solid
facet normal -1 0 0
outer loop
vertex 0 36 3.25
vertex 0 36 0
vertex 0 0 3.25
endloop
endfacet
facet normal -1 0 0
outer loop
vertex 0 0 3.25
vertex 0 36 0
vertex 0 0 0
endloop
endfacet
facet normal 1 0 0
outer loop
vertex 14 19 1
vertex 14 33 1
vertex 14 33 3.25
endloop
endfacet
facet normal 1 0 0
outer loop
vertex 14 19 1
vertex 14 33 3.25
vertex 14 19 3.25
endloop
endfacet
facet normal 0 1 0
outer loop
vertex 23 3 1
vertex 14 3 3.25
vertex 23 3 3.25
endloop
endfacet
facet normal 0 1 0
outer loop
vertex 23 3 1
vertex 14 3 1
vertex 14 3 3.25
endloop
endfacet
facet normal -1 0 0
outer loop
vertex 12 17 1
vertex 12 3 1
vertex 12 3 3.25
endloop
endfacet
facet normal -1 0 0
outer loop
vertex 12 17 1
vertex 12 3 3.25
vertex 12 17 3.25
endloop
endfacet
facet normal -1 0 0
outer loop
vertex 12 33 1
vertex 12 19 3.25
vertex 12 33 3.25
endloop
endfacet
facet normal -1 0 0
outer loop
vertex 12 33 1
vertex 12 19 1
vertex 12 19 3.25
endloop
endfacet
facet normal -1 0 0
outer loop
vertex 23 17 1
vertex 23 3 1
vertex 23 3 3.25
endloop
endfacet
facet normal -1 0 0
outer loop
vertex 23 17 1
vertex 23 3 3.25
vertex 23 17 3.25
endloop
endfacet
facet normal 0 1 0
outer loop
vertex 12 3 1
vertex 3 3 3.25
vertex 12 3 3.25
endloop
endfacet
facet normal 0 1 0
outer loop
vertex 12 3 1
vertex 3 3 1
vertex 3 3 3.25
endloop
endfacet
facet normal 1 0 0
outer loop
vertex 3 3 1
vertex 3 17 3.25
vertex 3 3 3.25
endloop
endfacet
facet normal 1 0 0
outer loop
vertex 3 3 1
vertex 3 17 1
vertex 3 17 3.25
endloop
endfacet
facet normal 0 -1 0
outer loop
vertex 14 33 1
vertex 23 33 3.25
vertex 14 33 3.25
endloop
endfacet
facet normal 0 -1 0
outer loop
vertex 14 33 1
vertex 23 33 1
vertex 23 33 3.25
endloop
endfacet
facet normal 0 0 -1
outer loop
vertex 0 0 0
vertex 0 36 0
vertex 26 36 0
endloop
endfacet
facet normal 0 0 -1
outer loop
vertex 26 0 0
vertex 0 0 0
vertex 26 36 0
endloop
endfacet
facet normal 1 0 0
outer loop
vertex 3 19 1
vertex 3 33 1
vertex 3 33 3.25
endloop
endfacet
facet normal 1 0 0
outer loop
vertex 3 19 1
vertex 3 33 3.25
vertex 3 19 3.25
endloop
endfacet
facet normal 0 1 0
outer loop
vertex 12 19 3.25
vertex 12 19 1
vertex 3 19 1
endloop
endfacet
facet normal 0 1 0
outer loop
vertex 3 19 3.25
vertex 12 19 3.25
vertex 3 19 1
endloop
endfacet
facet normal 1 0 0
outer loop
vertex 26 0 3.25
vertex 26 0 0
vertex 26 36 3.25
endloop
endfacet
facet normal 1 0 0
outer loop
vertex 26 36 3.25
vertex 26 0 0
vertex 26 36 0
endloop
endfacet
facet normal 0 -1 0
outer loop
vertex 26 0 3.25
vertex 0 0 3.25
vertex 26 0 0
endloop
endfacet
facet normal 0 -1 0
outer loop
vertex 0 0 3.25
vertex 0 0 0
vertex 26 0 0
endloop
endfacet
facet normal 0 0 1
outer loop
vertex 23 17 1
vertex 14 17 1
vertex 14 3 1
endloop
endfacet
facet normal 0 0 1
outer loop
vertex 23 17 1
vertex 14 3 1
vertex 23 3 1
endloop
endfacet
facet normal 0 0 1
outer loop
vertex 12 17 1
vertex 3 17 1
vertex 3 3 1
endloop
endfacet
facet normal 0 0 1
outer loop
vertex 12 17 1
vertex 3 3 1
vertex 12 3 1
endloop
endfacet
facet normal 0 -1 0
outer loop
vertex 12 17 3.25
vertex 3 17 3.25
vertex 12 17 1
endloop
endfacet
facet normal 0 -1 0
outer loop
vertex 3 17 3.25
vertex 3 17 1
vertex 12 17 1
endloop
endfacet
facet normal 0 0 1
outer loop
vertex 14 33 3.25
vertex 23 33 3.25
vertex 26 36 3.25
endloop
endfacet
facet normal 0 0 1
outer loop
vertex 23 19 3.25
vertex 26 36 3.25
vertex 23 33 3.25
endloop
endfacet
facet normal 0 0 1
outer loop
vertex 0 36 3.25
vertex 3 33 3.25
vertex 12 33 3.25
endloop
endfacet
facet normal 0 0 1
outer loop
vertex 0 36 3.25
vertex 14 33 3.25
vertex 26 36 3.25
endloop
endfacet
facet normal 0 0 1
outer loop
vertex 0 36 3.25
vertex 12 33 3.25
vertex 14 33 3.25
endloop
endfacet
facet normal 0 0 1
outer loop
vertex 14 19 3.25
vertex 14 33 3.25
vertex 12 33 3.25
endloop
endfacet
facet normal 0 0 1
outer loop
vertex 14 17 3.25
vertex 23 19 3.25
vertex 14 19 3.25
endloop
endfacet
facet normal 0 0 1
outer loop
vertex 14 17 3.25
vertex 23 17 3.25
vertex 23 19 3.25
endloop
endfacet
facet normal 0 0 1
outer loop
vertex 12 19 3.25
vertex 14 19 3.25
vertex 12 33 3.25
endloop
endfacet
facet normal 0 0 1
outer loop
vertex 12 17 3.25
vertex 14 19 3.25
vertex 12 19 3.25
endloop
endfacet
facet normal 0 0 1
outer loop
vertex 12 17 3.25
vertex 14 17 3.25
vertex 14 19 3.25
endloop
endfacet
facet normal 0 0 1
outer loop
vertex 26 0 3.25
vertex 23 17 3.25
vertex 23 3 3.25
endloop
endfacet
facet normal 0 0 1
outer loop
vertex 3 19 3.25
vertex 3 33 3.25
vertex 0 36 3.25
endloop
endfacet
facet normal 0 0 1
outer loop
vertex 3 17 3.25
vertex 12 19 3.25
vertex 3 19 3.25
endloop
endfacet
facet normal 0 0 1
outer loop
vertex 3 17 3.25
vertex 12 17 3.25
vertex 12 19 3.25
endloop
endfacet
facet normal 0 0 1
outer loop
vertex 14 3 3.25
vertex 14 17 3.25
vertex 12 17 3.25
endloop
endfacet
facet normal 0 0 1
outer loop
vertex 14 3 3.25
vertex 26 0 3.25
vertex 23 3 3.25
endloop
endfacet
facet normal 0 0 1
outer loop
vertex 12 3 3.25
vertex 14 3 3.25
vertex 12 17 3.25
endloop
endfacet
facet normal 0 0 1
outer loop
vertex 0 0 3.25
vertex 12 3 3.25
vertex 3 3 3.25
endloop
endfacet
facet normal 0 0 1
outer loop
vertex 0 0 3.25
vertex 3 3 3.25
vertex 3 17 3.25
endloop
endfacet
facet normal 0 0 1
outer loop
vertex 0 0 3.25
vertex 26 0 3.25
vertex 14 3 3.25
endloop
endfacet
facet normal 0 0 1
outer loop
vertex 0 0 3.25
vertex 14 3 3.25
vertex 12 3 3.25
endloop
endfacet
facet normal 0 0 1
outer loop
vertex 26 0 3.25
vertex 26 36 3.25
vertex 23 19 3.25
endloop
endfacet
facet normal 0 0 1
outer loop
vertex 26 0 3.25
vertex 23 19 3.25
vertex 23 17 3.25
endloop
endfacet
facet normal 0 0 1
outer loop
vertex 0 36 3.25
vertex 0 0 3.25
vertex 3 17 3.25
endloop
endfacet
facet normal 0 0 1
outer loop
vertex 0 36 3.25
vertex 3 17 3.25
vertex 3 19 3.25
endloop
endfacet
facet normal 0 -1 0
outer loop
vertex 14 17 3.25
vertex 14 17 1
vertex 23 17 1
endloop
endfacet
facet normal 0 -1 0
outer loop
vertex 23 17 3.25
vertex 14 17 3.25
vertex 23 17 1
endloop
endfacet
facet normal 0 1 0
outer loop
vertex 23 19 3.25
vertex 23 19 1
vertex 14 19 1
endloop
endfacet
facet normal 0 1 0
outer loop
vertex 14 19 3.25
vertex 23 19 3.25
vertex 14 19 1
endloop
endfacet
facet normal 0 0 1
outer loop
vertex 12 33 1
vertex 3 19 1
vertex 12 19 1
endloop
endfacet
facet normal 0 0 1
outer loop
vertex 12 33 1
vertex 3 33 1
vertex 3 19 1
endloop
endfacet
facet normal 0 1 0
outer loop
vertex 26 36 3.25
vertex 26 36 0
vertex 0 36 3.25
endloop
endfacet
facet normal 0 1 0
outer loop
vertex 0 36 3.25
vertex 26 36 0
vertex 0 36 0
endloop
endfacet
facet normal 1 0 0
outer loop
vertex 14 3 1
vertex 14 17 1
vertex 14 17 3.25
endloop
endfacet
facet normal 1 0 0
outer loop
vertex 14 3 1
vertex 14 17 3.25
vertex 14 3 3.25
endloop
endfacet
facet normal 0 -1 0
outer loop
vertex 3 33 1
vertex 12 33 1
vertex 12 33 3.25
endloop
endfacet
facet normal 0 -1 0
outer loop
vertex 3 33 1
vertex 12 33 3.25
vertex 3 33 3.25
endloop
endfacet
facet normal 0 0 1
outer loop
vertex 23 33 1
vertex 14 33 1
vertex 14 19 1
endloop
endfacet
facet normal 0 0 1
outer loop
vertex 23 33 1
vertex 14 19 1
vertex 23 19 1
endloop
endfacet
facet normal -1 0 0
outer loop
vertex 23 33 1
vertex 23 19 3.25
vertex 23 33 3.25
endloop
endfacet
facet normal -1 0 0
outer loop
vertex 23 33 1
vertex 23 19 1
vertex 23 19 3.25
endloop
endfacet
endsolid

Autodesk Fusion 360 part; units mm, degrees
sketch "Sketch1" plane through (0, 0, 0) normal (0, 0, 1) x (1, 0, 0)
  line L0 (0, 0) -> (26, 0)
  line L1 (26, 0) -> (26, 36)
  line L2 (26, 36) -> (0, 36)
  line L3 (0, 36) -> (0, 0)
  line L4 (3, 3) -> (23, 3)
  line L5 (3, 33) -> (3, 3)
  line L6 (23, 3) -> (23, 33)
  line L7 (23, 33) -> (3, 33)
  dimension "d2" = 30
sketch "Sketch3" plane through (0, 0, 0) normal (0, 0, 1) x (1, 0, 0)
  line L0 (12, 33) -> (14, 33)
  line L1 (14, 33) -> (14, 3)
  line L2 (14, 3) -> (12, 3)
  line L3 (12, 3) -> (12, 33)
  line L4 (23, 19) -> (3, 19)
  line L5 (3, 19) -> (3, 17)
  line L6 (3, 17) -> (23, 17)
  line L7 (23, 17) -> (23, 19)
extrude "Extrude1" add sketch "Sketch1" along normal blind 4
extrude "Extrude5" add sketch "Sketch3" along normal blind 4 contours L0 L1 L3 L4 | L1 L3 L4 L6 | L1 L2 L3 L6
extrude "Extrude6" add sketch "Sketch3" along normal blind 4 contours L3 L4 L5 L6
extrude "Extrude7" add sketch "Sketch3" along normal blind 4 contours L1 L4 L6 L7
sketch "Sketch5" plane through (0, 0, 0) normal (0, 0, 1) x (1, 0, 0)
  line L0 (26, 36) -> (0, 36)
  line L1 (0, 0) -> (26, 0)
  line L2 (0, 36) -> (0, 0)
  line L3 (26, 0) -> (26, 36)
extrude "Extrude9" add sketch "Sketch5" along normal blind 1
sketch "Sketch6" plane through (0, 0, 4) normal (0, 0, 1) x (-1, 0, 0)
  line L0 (-14, -19) -> (-14, -33)
  line L1 (-14, -33) -> (-23, -33)
  line L2 (-23, -33) -> (-23, -19)
  line L3 (-23, -19) -> (-14, -19)
  line L4 (-3, -19) -> (-3, -33)
  line L5 (-3, -33) -> (-12, -33)
  line L6 (-12, -33) -> (-12, -19)
  line L7 (-12, -19) -> (-3, -19)
  line L8 (-14, -17) -> (-23, -17)
  line L9 (-23, -17) -> (-23, -3)
  line L10 (-23, -3) -> (-14, -3)
  line L11 (-14, -3) -> (-14, -17)
  line L12 (-3, -17) -> (-12, -17)
  line L13 (-12, -17) -> (-12, -3)
  line L14 (-12, -3) -> (-3, -3)
  line L15 (-3, -3) -> (-3, -17)
  line L16 (0, -36) -> (0, 0)
  line L17 (0, 0) -> (-26, 0)
  line L18 (-26, 0) -> (-26, -36)
  line L19 (-26, -36) -> (0, -36)
extrude "Extrude10" cut sketch "Sketch6" against normal blind 0.75
extrude "Extrude8" [suppressed]
extrude "Extrude4" [suppressed]
extrude "Extrude3" [suppressed]
extrude "Extrude2" [suppressed]
